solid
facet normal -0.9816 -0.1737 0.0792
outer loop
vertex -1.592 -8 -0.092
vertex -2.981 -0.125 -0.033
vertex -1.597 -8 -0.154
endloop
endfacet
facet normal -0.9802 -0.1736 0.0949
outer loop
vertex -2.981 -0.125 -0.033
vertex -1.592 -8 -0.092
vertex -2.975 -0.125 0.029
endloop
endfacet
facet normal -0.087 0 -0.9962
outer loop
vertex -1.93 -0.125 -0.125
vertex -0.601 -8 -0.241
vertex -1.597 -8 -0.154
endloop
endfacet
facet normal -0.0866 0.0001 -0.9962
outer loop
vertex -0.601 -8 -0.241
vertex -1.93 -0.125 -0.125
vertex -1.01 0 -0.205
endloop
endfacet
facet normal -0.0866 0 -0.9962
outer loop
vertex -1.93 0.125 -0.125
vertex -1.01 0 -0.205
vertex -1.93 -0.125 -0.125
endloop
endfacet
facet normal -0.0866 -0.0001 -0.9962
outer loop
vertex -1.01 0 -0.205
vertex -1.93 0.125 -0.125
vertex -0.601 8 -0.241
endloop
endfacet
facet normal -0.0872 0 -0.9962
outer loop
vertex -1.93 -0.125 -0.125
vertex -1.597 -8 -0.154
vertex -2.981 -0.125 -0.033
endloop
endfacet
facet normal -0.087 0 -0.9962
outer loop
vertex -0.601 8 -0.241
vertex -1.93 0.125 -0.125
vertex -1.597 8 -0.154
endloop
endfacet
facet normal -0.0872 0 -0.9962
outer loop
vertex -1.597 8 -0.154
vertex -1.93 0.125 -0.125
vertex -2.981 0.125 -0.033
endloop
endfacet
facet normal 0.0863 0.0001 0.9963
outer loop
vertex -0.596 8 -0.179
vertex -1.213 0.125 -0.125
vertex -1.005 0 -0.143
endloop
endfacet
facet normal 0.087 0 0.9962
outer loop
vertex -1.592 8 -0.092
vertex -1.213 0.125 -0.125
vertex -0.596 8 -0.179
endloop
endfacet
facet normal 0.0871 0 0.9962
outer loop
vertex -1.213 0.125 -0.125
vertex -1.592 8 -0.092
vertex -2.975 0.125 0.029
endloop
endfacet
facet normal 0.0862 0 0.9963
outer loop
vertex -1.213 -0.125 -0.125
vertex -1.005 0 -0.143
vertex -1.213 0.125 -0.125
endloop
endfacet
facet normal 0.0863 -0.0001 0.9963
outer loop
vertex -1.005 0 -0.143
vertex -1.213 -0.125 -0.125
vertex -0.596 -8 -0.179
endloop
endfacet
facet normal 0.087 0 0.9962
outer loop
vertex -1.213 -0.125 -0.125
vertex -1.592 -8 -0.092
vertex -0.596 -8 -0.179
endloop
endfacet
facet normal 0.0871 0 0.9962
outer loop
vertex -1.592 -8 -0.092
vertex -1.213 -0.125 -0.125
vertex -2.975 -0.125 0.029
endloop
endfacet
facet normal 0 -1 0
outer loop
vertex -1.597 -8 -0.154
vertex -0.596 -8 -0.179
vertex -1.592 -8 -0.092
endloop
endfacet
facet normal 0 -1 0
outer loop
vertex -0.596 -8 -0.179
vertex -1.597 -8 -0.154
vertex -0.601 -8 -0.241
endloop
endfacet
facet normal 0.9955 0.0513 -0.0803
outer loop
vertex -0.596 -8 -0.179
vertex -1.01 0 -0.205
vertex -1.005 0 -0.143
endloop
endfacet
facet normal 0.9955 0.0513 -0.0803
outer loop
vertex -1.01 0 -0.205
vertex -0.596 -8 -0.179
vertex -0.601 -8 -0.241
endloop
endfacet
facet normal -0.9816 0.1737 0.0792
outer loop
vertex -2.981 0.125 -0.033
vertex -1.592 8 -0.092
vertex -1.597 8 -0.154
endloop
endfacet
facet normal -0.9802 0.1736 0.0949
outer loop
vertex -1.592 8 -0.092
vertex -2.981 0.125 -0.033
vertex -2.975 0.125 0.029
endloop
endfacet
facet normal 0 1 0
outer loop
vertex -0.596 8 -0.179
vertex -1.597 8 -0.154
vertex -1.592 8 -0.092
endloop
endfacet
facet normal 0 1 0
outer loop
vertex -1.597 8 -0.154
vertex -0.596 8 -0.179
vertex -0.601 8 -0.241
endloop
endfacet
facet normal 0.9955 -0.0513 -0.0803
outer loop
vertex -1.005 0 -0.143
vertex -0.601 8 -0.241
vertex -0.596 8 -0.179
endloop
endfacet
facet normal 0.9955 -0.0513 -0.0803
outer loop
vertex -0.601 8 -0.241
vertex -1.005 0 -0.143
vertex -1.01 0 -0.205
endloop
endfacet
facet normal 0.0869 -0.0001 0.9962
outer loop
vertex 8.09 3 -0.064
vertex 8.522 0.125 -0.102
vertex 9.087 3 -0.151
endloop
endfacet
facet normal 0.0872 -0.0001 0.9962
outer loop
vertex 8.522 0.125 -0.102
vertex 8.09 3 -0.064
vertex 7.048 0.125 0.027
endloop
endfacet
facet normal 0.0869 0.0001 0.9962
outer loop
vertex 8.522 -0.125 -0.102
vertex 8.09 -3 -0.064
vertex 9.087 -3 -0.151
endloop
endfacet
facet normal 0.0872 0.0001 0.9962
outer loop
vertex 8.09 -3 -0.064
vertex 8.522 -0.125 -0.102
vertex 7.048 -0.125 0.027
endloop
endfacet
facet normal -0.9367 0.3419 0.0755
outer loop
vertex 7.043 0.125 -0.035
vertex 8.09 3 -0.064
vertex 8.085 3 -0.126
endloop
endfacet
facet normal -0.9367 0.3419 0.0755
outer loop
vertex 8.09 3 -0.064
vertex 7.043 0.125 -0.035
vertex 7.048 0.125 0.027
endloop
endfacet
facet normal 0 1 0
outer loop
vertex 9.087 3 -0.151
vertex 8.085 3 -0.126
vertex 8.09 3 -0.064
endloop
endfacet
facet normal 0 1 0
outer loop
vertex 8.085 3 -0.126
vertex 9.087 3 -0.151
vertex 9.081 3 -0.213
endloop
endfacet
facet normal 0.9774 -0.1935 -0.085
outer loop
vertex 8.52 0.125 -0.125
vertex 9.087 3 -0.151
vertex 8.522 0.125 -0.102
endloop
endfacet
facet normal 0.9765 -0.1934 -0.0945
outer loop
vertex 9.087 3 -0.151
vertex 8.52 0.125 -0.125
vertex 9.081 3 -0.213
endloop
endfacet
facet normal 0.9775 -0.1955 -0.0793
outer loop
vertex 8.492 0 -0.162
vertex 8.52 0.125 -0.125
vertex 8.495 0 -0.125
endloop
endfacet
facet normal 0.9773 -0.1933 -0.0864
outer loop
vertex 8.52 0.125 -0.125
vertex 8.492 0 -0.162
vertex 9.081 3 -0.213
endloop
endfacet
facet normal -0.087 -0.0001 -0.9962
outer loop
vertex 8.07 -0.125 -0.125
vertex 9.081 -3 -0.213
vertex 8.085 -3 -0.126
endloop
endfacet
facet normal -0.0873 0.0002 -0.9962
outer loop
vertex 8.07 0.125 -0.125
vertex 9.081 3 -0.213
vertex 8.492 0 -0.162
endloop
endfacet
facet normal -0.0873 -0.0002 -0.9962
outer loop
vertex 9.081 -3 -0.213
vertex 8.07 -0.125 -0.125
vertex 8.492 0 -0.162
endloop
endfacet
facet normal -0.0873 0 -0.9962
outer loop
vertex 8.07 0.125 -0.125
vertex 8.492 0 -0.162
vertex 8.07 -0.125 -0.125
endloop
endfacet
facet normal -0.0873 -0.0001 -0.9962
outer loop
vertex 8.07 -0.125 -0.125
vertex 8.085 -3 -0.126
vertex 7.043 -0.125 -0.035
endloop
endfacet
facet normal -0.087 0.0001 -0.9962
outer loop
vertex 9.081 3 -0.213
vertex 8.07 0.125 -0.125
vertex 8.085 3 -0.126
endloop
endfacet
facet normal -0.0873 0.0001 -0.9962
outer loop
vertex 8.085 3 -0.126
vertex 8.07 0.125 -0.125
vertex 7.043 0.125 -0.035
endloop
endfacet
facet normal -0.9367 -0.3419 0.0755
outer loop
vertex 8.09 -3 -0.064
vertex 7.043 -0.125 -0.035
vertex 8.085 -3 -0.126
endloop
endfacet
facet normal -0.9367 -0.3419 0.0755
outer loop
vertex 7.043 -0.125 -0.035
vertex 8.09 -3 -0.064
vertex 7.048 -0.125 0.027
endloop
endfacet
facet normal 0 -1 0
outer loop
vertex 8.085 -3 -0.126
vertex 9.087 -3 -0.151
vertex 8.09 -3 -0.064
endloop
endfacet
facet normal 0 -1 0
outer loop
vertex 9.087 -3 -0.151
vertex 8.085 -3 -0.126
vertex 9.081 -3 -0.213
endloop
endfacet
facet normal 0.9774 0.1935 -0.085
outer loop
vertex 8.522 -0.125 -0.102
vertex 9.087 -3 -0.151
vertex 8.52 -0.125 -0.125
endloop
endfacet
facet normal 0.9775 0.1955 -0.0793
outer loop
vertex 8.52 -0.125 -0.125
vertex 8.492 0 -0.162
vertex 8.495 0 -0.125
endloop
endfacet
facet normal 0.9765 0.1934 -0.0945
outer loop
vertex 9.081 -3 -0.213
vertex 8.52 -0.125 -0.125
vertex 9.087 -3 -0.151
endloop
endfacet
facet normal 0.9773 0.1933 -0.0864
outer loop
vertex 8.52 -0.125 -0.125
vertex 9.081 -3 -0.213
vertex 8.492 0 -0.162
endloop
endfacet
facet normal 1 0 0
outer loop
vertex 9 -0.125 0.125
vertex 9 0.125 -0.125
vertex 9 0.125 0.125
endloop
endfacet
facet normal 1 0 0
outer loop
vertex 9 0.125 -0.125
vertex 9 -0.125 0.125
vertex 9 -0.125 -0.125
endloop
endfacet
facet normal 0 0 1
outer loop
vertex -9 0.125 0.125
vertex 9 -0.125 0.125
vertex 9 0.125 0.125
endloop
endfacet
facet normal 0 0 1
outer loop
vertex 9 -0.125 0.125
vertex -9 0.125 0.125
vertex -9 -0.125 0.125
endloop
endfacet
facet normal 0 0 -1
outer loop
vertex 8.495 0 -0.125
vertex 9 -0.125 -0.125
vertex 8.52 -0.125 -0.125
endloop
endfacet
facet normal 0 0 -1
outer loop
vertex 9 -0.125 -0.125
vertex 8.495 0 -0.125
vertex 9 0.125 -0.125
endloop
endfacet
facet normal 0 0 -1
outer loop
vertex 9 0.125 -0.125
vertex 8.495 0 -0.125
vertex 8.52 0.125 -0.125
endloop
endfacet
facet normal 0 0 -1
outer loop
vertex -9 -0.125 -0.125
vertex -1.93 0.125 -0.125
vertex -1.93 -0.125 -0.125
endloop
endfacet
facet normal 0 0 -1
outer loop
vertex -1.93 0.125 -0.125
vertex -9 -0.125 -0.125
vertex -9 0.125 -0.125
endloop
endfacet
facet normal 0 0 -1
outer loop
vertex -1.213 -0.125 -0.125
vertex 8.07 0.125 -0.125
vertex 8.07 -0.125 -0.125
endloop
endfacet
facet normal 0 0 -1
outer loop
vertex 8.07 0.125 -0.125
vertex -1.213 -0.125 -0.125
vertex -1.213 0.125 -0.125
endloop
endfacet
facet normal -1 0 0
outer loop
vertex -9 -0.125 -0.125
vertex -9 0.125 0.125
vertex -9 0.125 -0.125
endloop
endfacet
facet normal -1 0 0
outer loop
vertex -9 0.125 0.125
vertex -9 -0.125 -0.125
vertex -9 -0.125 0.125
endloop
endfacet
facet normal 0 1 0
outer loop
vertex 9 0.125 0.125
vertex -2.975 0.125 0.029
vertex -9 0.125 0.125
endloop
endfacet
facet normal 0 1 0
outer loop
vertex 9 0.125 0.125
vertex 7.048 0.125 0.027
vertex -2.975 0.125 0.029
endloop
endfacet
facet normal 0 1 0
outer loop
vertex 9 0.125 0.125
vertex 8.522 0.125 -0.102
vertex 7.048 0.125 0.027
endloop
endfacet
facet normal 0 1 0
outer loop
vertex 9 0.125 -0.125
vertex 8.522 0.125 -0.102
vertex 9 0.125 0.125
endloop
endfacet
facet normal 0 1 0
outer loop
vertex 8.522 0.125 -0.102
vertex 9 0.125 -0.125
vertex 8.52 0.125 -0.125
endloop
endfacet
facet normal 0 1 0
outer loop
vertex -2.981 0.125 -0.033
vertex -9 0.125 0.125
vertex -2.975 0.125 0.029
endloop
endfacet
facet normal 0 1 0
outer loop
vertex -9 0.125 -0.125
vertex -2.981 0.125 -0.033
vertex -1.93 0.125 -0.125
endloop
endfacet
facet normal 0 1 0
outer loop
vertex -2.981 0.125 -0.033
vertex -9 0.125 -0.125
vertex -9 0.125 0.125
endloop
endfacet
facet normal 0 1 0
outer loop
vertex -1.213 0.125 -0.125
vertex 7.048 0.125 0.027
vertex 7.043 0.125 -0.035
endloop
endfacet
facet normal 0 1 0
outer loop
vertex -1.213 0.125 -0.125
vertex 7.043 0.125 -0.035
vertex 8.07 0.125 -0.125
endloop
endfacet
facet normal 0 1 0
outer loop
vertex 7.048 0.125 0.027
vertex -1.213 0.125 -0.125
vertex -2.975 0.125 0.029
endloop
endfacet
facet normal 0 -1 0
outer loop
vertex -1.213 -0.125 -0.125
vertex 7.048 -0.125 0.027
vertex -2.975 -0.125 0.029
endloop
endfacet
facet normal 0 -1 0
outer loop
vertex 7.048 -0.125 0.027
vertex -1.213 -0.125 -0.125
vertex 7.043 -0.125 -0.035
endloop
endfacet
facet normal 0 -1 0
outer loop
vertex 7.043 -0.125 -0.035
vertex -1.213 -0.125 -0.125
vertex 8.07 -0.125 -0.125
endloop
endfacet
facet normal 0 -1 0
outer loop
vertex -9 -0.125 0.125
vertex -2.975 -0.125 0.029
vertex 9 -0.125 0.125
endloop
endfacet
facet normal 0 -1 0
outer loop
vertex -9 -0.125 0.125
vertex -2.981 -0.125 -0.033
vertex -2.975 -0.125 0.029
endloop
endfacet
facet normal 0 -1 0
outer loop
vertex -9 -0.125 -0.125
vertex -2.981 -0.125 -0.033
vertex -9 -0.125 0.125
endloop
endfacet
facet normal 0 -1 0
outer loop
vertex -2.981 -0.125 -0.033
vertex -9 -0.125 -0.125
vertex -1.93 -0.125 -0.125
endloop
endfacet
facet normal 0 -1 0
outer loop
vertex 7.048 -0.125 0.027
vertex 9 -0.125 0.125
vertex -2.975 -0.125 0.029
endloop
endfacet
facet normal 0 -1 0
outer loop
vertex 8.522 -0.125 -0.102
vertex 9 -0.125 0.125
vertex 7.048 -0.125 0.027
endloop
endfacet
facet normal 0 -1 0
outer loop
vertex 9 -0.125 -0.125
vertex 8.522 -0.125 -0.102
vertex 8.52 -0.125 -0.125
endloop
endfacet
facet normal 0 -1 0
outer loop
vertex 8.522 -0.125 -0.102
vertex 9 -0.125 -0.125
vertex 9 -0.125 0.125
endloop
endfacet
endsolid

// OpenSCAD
//for Canard of Aircraft
canardWingSpan = 3;
canardWingTipChord = 1;
canardWingRootChord = 1.5;
canardWingSweepAngle = 20;
canardWingDihedralAngle = 0;
canardWingXPos = 7;
canardWingAngleOfAttack = 5;

//for Main wing of aircraft
mainWingSpan = 8;
mainWingTipChord = 1;
mainWingRootChord = 2;
mainWingSweepAngle = 10;
mainWingDihedralAngle = 0;
mainWingXPos = -3;  //Yes, yes, I know it's negative, big fucking brohaha.
mainWingAngleOfAttack = 5;

// for fuselage of Aircraft
fuselageLength = 18;
fuselageWidth = 0.25;


module generateWing(Span,TipChord,RootChord,SweepAngle,DihedralAngle,flip)
{

   linear_extrude(height = 1/16, center = true, convexity = 10, twist = 0)
    translate([0, 0, 0])
    if (flip==true)
    {polygon(points=[[0,0],
                    [0+Span,0-Span/tan(90-SweepAngle)],
                    [0+Span,0-Span/tan(90-SweepAngle)-TipChord],
                    [0,0-RootChord],
                    ],
                paths=[[0,1,2,3]]);
    }
    else {    polygon(points=[[0,0],
                    [0-Span,0-Span/tan(90-SweepAngle)],
                    [0-Span,0-Span/tan(90-SweepAngle)-TipChord],
                    [0,0-RootChord],
                    ],
                paths=[[0,1,2,3]]);
    }
//forwardLeft = [0,0,0] //starts from the origin //forwardRight = [0+Span,0-Span/tan(SweepAngle),0]
//backwardLeft = [0,0-RootChord,0] //backwardRight = [0+Span,0-Span/tan(SweepAngle)-TipChord,0]
    }

// actual code begins here

union(){
//drawing the fuselage
cube(size = [fuselageLength,fuselageWidth,fuselageWidth], center = true);
//drawing the wings
translate([mainWingXPos,0,0]){
rotate([mainWingAngleOfAttack,0,90]){
generateWing(Span=mainWingSpan,TipChord=mainWingTipChord,RootChord=mainWingRootChord,SweepAngle=mainWingSweepAngle,DihedralAngle=mainWingDihedralAngle,flip = false);
generateWing(Span=mainWingSpan,TipChord=mainWingTipChord,RootChord=mainWingRootChord,SweepAngle=mainWingSweepAngle,DihedralAngle=mainWingDihedralAngle,flip = true);
};
};

translate([canardWingXPos,0,0]){
rotate([canardWingAngleOfAttack,0,90]){
generateWing(Span=canardWingSpan,TipChord=canardWingTipChord,RootChord=canardWingRootChord,SweepAngle=canardWingSweepAngle,DihedralAngle=canardWingDihedralAngle,flip = true);
generateWing(Span=canardWingSpan,TipChord=canardWingTipChord,RootChord=canardWingRootChord,SweepAngle=canardWingSweepAngle,DihedralAngle=canardWingDihedralAngle,flip = false);
};
};
};
